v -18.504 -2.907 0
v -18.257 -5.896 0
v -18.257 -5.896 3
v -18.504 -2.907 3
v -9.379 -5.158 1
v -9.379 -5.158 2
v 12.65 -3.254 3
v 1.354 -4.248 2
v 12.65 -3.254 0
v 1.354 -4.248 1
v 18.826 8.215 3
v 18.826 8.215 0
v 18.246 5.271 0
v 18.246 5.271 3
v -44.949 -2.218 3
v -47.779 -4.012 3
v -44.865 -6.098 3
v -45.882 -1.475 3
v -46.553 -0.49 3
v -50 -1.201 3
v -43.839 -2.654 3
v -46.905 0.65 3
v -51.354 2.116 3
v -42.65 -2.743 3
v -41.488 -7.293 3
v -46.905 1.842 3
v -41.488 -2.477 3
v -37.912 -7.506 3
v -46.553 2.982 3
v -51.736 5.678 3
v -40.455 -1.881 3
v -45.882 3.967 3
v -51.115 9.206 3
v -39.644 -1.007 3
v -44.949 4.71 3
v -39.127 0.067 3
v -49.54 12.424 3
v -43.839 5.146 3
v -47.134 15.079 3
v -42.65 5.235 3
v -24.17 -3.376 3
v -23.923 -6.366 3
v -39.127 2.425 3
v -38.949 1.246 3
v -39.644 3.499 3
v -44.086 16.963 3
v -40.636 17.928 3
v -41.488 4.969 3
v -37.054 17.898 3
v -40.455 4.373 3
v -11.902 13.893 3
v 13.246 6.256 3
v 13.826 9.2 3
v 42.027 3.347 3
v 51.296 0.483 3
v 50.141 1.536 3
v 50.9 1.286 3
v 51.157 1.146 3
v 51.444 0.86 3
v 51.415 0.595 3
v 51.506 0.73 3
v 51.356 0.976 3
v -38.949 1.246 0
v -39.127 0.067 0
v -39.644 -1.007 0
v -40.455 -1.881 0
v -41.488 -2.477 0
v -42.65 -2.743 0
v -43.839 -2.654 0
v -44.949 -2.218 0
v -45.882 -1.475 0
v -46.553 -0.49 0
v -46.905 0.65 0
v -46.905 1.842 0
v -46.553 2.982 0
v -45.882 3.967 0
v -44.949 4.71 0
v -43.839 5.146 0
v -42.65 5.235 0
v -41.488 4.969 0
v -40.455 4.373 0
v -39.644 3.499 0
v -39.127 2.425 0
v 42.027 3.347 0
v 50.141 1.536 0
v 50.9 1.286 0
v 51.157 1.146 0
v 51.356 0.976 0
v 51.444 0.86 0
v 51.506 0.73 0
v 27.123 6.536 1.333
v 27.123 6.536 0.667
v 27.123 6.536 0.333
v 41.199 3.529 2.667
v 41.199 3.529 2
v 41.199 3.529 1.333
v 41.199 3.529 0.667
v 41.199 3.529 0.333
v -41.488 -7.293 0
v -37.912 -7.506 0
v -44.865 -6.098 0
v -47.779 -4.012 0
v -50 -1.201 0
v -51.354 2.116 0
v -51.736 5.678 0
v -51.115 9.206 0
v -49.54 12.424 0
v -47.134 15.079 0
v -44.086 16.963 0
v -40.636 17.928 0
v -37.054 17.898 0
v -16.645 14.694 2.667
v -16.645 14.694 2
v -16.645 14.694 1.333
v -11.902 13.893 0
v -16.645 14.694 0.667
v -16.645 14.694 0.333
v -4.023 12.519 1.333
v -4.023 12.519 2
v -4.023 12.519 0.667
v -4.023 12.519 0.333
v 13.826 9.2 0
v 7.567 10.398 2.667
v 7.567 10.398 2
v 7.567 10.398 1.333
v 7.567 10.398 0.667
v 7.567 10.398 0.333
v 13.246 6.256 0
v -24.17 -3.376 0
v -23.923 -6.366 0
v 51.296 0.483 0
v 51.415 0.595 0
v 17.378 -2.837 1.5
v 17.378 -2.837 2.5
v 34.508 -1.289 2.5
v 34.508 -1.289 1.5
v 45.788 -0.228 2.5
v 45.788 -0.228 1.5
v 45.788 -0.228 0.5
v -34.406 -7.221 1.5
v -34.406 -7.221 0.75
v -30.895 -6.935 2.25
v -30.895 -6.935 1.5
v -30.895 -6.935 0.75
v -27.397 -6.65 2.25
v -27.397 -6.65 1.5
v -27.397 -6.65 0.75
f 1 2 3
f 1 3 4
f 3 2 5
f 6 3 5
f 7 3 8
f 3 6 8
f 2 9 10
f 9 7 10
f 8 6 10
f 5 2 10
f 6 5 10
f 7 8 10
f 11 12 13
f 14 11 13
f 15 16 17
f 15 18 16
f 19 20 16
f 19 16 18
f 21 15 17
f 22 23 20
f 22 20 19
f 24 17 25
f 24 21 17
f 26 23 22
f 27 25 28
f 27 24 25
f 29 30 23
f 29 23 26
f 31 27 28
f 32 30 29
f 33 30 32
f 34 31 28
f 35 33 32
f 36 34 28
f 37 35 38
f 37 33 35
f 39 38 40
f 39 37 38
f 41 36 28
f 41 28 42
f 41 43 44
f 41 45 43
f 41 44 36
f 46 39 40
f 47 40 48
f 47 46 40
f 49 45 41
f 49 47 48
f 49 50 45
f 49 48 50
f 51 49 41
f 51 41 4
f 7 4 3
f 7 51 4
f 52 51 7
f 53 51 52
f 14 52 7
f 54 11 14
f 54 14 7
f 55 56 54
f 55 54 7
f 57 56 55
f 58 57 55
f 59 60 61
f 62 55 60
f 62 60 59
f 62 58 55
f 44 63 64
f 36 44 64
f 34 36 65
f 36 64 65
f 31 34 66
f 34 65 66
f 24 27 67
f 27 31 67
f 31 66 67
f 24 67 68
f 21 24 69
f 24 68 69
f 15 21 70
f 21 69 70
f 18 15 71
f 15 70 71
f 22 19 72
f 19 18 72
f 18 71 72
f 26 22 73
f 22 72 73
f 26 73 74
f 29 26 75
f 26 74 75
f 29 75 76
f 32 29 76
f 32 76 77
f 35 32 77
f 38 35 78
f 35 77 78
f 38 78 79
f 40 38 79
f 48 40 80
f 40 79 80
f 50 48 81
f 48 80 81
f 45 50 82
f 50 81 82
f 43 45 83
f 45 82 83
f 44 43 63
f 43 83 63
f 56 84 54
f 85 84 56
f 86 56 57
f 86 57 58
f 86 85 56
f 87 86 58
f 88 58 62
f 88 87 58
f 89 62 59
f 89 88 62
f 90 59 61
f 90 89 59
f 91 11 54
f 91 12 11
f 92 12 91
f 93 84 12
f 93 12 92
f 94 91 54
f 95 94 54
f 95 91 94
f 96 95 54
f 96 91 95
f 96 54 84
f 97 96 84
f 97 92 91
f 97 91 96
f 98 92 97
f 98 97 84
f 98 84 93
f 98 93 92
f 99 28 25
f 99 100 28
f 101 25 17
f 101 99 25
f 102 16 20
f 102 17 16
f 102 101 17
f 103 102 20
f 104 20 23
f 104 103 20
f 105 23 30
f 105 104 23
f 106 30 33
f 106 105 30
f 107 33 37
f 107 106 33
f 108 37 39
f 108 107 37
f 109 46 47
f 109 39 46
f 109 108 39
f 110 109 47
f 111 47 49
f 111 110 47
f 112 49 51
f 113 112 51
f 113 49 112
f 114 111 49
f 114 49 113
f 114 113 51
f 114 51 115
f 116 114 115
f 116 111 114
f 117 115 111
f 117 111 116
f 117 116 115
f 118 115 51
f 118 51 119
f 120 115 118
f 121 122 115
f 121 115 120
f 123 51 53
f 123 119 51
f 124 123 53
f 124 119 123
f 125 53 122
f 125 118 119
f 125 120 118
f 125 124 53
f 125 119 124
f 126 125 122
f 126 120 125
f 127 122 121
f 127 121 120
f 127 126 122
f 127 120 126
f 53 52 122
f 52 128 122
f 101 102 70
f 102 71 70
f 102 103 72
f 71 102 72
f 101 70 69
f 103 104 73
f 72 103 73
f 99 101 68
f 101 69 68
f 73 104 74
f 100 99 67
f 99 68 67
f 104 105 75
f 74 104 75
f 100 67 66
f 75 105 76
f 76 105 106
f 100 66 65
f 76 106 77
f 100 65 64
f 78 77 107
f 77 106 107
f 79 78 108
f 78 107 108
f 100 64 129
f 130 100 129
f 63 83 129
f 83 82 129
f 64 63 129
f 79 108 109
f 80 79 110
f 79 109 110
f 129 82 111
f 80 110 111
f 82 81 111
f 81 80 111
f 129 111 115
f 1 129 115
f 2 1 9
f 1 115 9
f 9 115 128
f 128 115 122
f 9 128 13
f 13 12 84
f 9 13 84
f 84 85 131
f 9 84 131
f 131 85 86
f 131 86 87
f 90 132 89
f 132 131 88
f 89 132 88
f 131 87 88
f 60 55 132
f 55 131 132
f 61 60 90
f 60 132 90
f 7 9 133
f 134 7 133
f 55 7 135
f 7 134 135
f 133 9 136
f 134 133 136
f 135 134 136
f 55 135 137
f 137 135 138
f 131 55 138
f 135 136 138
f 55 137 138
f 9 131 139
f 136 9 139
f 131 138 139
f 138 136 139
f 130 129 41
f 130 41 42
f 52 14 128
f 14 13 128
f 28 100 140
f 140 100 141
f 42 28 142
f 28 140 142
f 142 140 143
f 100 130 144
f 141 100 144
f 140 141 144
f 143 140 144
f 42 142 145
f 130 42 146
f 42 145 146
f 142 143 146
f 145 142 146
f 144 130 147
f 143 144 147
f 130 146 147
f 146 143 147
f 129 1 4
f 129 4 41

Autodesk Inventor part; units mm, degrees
ref_plane "YZ Plane" through (0, 0, 0) normal (1, 0, 0) x (0, 1, 0)
ref_plane "XZ Plane" through (0, 0, 0) normal (0, 1, 0) x (-1, 0, 0)
ref_plane "XY Plane" through (0, 0, 0) normal (0, 0, 1) x (1, 0, 0)
sketch "Sketch1" plane through (0, 0, 0) normal (0, 0, 1) x (1, 0, 0)
  line L0 (18.8258, 8.2146) -> (18.2459, 5.2712)
  line L1 (13.8258, 9.1997) -> (18.8258, 8.2146)
  line L2 (13.2459, 6.2563) -> (13.8258, 9.1997)
  line L3 (18.2459, 5.2712) -> (13.2459, 6.2563)
  spline S0 degree 4 poles (-37.0536, 17.8985) (-31.9132, 17.1283) (-23.3374, 15.8227) (-12.0164, 13.952) (1.6833, 11.5136) (12.6703, 9.4495) (22.4286, 7.5004) (30.8762, 5.7811) (37.8566, 4.2164) (44.6668, 2.844) (48.6838, 1.6374) (51.2021, 1.5715) (51.5064, 0.7295) knots 0 0 0 0 0 0.183688 0.302378 0.416104 0.523956 0.624947 0.717922 0.80148 0.87369 1 1 1 1 1
  spline S1 degree 2 poles (-25.4832, 9.8892) (-25.3745, 9.8731) (-25.2658, 9.857) knots 0 0 0 1 1 1
  line L4 (-25.288, 9.8603) -> (-25.2437, 9.8537) construction
  arc A0 (-25.2481, 9.8544) -> (-25.2836, 9.8596) centre (-40.8454, -94.9669) ccw construction
  line L5 (-24.1701, -3.3757) -> (-23.9226, -6.3655)
  line L6 (-23.9226, -6.3655) -> (-18.2567, -5.8963)
  line L7 (-18.5043, -2.9066) -> (-24.1701, -3.3757)
  line L8 (-38.9493, 5.246) -> (-38.9493, 1.246)
  line L9 (-38.9493, 1.246) -> (-42.9493, 1.246)
  circle A1 centre (-42.9493, 1.246) radius 4
  arc A2 (-37.0536, 17.8985) -> (-37.9116, -7.5055) centre (-38.9493, 5.246) ccw
  line L10 (-18.2567, -5.8963) -> (-18.5043, -2.9066)
  line L11 (-20.2449, -6.0621) -> (-16.2685, -5.7306) construction
  arc A3 (-19.8473, -6.0287) -> (-16.6662, -5.7635) centre (-448.7094, 5192.5355) ccw construction
  spline S2 degree 4 poles (-37.9116, -7.5055) (-32.9709, -7.1034) (-27.9645, -6.6996) (-23.0652, -6.2972) (-18.2567, -5.8963) knots 0 0 0 0 0 1 1 1 1 1
  spline S3 degree 4 poles (9.5327, -3.5271) (11.5362, -3.3527) (15.9784, -2.9631) (22.4725, -2.3822) (30.437, -1.6876) (37.5387, -0.9836) (44.4552, -0.4713) (48.5891, 0.2001) (51.0913, -0.0596) (51.5064, 0.7295) knots 0.442408 0.442408 0.442408 0.442408 0.442408 0.523404 0.624432 0.717481 0.801136 0.873452 1 1 1 1 1
  line L12 (4.8603, -3.9339) -> (14.2051, -3.1204) construction
  arc A4 (5.7946, -3.8508) -> (13.2705, -3.2) centre (-353.3588, 4165.0638) ccw construction
  line L13 (-18.2567, -5.8963) -> (-10.7368, -5.2737) construction
  line L14 (-10.7368, -5.2737) -> (1.5027, -4.2602) construction
  line L15 (1.5027, -4.2602) -> (12.6504, -3.2545) construction
  spline S4 degree 3 poles (-18.2567, -5.8963) (-10.7368, -5.2737) (1.5027, -4.2602) (12.6504, -3.2545) knots 1 1 1 1 2 2 2 2
  point P0 (1.0416, 3.4084)
  point P1 (-2.4286, 1.7343)
  point P2 (-23.0646, 15.7415)
  point P3 (-9.9126, 13.5515)
  point P4 (2.2524, 11.3855)
  point P5 (13.3074, 9.3005)
  point P6 (23.1324, 7.3505)
  point P7 (31.6224, 5.5895)
  point P8 (38.6934, 4.0655)
  point P9 (44.2674, 2.8295)
  point P10 (48.2934, 1.9175)
  point P11 (50.7234, 1.3595)
  point P12 (31.1964, -1.5985)
  point P13 (38.3844, -0.9415)
  point P14 (44.0604, -0.4135)
  point P15 (48.1644, -0.0265)
  point P16 (50.6454, 0.2105)
  point P17 (-51.7356, 5.6816)
  point P18 (51.5064, 1.1705)
  point P19 (-51.7356, 19.9655)
  point P20 (-52.5456, -8.6665)
  point P21 (51.5064, 0.2885)
  point P22 (-37.0536, 5.2315)
  point P23 (-23.0646, 4.7238)
  point P24 (-9.9126, 4.1787)
  point P25 (2.2524, 3.6151)
  point P26 (13.3074, 3.0521)
  point P27 (23.1324, 2.5121)
  point P28 (31.6224, 2.015)
  point P29 (38.6934, 1.5764)
  point P30 (44.2674, 1.2178)
  point P31 (48.2934, 0.9517)
  point P32 (50.7234, 0.7885)
  point P33 (-25.8264, -0.2724)
  point P34 (9.9408, 3.0216)
  point P35 (-19.8876, 9.0264)
  point P36 (-14.6268, 8.1504)
  point P37 (-9.7608, 7.284)
  point P38 (-5.3388, 6.45)
  point P39 (-1.4088, 5.67)
  point P40 (1.9872, 4.9656)
  point P41 (4.8156, 4.356)
  point P42 (7.0452, 3.8616)
  point P43 (8.6556, 3.4968)
  point P44 (9.6276, 3.2736)
  point P45 (-20.2308, 0.1836)
  point P46 (-14.9568, 0.624)
  point P47 (-10.062, 1.0416)
  point P48 (-5.6016, 1.428)
  point P49 (-1.6272, 1.7796)
  point P50 (1.8168, 2.0904)
  point P51 (4.692, 2.3532)
  point P52 (6.9624, 2.5644)
  point P53 (8.604, 2.7192)
  point P54 (9.5964, 2.814)
  point P55 (9.5327, -3.5271)
  dimension "d11" = 3
  dimension "d12" = 5
  dimension "d13" = 52.7751
  dimension "d14" = 3
  dimension "d15" = 5.6658
  dimension "d16" = 4
  dimension "d17" = 4
  dimension "d18" = 8
extrude "Extrusion2" add sketch "Sketch1" along normal blind 3 contours S0 S3 S4 L10 L7 L5 S2 A2 L2 L3 L0
properties part number "2P.03.01.09.IM.FlapRibEnd" material "Wood (Walnut)"
